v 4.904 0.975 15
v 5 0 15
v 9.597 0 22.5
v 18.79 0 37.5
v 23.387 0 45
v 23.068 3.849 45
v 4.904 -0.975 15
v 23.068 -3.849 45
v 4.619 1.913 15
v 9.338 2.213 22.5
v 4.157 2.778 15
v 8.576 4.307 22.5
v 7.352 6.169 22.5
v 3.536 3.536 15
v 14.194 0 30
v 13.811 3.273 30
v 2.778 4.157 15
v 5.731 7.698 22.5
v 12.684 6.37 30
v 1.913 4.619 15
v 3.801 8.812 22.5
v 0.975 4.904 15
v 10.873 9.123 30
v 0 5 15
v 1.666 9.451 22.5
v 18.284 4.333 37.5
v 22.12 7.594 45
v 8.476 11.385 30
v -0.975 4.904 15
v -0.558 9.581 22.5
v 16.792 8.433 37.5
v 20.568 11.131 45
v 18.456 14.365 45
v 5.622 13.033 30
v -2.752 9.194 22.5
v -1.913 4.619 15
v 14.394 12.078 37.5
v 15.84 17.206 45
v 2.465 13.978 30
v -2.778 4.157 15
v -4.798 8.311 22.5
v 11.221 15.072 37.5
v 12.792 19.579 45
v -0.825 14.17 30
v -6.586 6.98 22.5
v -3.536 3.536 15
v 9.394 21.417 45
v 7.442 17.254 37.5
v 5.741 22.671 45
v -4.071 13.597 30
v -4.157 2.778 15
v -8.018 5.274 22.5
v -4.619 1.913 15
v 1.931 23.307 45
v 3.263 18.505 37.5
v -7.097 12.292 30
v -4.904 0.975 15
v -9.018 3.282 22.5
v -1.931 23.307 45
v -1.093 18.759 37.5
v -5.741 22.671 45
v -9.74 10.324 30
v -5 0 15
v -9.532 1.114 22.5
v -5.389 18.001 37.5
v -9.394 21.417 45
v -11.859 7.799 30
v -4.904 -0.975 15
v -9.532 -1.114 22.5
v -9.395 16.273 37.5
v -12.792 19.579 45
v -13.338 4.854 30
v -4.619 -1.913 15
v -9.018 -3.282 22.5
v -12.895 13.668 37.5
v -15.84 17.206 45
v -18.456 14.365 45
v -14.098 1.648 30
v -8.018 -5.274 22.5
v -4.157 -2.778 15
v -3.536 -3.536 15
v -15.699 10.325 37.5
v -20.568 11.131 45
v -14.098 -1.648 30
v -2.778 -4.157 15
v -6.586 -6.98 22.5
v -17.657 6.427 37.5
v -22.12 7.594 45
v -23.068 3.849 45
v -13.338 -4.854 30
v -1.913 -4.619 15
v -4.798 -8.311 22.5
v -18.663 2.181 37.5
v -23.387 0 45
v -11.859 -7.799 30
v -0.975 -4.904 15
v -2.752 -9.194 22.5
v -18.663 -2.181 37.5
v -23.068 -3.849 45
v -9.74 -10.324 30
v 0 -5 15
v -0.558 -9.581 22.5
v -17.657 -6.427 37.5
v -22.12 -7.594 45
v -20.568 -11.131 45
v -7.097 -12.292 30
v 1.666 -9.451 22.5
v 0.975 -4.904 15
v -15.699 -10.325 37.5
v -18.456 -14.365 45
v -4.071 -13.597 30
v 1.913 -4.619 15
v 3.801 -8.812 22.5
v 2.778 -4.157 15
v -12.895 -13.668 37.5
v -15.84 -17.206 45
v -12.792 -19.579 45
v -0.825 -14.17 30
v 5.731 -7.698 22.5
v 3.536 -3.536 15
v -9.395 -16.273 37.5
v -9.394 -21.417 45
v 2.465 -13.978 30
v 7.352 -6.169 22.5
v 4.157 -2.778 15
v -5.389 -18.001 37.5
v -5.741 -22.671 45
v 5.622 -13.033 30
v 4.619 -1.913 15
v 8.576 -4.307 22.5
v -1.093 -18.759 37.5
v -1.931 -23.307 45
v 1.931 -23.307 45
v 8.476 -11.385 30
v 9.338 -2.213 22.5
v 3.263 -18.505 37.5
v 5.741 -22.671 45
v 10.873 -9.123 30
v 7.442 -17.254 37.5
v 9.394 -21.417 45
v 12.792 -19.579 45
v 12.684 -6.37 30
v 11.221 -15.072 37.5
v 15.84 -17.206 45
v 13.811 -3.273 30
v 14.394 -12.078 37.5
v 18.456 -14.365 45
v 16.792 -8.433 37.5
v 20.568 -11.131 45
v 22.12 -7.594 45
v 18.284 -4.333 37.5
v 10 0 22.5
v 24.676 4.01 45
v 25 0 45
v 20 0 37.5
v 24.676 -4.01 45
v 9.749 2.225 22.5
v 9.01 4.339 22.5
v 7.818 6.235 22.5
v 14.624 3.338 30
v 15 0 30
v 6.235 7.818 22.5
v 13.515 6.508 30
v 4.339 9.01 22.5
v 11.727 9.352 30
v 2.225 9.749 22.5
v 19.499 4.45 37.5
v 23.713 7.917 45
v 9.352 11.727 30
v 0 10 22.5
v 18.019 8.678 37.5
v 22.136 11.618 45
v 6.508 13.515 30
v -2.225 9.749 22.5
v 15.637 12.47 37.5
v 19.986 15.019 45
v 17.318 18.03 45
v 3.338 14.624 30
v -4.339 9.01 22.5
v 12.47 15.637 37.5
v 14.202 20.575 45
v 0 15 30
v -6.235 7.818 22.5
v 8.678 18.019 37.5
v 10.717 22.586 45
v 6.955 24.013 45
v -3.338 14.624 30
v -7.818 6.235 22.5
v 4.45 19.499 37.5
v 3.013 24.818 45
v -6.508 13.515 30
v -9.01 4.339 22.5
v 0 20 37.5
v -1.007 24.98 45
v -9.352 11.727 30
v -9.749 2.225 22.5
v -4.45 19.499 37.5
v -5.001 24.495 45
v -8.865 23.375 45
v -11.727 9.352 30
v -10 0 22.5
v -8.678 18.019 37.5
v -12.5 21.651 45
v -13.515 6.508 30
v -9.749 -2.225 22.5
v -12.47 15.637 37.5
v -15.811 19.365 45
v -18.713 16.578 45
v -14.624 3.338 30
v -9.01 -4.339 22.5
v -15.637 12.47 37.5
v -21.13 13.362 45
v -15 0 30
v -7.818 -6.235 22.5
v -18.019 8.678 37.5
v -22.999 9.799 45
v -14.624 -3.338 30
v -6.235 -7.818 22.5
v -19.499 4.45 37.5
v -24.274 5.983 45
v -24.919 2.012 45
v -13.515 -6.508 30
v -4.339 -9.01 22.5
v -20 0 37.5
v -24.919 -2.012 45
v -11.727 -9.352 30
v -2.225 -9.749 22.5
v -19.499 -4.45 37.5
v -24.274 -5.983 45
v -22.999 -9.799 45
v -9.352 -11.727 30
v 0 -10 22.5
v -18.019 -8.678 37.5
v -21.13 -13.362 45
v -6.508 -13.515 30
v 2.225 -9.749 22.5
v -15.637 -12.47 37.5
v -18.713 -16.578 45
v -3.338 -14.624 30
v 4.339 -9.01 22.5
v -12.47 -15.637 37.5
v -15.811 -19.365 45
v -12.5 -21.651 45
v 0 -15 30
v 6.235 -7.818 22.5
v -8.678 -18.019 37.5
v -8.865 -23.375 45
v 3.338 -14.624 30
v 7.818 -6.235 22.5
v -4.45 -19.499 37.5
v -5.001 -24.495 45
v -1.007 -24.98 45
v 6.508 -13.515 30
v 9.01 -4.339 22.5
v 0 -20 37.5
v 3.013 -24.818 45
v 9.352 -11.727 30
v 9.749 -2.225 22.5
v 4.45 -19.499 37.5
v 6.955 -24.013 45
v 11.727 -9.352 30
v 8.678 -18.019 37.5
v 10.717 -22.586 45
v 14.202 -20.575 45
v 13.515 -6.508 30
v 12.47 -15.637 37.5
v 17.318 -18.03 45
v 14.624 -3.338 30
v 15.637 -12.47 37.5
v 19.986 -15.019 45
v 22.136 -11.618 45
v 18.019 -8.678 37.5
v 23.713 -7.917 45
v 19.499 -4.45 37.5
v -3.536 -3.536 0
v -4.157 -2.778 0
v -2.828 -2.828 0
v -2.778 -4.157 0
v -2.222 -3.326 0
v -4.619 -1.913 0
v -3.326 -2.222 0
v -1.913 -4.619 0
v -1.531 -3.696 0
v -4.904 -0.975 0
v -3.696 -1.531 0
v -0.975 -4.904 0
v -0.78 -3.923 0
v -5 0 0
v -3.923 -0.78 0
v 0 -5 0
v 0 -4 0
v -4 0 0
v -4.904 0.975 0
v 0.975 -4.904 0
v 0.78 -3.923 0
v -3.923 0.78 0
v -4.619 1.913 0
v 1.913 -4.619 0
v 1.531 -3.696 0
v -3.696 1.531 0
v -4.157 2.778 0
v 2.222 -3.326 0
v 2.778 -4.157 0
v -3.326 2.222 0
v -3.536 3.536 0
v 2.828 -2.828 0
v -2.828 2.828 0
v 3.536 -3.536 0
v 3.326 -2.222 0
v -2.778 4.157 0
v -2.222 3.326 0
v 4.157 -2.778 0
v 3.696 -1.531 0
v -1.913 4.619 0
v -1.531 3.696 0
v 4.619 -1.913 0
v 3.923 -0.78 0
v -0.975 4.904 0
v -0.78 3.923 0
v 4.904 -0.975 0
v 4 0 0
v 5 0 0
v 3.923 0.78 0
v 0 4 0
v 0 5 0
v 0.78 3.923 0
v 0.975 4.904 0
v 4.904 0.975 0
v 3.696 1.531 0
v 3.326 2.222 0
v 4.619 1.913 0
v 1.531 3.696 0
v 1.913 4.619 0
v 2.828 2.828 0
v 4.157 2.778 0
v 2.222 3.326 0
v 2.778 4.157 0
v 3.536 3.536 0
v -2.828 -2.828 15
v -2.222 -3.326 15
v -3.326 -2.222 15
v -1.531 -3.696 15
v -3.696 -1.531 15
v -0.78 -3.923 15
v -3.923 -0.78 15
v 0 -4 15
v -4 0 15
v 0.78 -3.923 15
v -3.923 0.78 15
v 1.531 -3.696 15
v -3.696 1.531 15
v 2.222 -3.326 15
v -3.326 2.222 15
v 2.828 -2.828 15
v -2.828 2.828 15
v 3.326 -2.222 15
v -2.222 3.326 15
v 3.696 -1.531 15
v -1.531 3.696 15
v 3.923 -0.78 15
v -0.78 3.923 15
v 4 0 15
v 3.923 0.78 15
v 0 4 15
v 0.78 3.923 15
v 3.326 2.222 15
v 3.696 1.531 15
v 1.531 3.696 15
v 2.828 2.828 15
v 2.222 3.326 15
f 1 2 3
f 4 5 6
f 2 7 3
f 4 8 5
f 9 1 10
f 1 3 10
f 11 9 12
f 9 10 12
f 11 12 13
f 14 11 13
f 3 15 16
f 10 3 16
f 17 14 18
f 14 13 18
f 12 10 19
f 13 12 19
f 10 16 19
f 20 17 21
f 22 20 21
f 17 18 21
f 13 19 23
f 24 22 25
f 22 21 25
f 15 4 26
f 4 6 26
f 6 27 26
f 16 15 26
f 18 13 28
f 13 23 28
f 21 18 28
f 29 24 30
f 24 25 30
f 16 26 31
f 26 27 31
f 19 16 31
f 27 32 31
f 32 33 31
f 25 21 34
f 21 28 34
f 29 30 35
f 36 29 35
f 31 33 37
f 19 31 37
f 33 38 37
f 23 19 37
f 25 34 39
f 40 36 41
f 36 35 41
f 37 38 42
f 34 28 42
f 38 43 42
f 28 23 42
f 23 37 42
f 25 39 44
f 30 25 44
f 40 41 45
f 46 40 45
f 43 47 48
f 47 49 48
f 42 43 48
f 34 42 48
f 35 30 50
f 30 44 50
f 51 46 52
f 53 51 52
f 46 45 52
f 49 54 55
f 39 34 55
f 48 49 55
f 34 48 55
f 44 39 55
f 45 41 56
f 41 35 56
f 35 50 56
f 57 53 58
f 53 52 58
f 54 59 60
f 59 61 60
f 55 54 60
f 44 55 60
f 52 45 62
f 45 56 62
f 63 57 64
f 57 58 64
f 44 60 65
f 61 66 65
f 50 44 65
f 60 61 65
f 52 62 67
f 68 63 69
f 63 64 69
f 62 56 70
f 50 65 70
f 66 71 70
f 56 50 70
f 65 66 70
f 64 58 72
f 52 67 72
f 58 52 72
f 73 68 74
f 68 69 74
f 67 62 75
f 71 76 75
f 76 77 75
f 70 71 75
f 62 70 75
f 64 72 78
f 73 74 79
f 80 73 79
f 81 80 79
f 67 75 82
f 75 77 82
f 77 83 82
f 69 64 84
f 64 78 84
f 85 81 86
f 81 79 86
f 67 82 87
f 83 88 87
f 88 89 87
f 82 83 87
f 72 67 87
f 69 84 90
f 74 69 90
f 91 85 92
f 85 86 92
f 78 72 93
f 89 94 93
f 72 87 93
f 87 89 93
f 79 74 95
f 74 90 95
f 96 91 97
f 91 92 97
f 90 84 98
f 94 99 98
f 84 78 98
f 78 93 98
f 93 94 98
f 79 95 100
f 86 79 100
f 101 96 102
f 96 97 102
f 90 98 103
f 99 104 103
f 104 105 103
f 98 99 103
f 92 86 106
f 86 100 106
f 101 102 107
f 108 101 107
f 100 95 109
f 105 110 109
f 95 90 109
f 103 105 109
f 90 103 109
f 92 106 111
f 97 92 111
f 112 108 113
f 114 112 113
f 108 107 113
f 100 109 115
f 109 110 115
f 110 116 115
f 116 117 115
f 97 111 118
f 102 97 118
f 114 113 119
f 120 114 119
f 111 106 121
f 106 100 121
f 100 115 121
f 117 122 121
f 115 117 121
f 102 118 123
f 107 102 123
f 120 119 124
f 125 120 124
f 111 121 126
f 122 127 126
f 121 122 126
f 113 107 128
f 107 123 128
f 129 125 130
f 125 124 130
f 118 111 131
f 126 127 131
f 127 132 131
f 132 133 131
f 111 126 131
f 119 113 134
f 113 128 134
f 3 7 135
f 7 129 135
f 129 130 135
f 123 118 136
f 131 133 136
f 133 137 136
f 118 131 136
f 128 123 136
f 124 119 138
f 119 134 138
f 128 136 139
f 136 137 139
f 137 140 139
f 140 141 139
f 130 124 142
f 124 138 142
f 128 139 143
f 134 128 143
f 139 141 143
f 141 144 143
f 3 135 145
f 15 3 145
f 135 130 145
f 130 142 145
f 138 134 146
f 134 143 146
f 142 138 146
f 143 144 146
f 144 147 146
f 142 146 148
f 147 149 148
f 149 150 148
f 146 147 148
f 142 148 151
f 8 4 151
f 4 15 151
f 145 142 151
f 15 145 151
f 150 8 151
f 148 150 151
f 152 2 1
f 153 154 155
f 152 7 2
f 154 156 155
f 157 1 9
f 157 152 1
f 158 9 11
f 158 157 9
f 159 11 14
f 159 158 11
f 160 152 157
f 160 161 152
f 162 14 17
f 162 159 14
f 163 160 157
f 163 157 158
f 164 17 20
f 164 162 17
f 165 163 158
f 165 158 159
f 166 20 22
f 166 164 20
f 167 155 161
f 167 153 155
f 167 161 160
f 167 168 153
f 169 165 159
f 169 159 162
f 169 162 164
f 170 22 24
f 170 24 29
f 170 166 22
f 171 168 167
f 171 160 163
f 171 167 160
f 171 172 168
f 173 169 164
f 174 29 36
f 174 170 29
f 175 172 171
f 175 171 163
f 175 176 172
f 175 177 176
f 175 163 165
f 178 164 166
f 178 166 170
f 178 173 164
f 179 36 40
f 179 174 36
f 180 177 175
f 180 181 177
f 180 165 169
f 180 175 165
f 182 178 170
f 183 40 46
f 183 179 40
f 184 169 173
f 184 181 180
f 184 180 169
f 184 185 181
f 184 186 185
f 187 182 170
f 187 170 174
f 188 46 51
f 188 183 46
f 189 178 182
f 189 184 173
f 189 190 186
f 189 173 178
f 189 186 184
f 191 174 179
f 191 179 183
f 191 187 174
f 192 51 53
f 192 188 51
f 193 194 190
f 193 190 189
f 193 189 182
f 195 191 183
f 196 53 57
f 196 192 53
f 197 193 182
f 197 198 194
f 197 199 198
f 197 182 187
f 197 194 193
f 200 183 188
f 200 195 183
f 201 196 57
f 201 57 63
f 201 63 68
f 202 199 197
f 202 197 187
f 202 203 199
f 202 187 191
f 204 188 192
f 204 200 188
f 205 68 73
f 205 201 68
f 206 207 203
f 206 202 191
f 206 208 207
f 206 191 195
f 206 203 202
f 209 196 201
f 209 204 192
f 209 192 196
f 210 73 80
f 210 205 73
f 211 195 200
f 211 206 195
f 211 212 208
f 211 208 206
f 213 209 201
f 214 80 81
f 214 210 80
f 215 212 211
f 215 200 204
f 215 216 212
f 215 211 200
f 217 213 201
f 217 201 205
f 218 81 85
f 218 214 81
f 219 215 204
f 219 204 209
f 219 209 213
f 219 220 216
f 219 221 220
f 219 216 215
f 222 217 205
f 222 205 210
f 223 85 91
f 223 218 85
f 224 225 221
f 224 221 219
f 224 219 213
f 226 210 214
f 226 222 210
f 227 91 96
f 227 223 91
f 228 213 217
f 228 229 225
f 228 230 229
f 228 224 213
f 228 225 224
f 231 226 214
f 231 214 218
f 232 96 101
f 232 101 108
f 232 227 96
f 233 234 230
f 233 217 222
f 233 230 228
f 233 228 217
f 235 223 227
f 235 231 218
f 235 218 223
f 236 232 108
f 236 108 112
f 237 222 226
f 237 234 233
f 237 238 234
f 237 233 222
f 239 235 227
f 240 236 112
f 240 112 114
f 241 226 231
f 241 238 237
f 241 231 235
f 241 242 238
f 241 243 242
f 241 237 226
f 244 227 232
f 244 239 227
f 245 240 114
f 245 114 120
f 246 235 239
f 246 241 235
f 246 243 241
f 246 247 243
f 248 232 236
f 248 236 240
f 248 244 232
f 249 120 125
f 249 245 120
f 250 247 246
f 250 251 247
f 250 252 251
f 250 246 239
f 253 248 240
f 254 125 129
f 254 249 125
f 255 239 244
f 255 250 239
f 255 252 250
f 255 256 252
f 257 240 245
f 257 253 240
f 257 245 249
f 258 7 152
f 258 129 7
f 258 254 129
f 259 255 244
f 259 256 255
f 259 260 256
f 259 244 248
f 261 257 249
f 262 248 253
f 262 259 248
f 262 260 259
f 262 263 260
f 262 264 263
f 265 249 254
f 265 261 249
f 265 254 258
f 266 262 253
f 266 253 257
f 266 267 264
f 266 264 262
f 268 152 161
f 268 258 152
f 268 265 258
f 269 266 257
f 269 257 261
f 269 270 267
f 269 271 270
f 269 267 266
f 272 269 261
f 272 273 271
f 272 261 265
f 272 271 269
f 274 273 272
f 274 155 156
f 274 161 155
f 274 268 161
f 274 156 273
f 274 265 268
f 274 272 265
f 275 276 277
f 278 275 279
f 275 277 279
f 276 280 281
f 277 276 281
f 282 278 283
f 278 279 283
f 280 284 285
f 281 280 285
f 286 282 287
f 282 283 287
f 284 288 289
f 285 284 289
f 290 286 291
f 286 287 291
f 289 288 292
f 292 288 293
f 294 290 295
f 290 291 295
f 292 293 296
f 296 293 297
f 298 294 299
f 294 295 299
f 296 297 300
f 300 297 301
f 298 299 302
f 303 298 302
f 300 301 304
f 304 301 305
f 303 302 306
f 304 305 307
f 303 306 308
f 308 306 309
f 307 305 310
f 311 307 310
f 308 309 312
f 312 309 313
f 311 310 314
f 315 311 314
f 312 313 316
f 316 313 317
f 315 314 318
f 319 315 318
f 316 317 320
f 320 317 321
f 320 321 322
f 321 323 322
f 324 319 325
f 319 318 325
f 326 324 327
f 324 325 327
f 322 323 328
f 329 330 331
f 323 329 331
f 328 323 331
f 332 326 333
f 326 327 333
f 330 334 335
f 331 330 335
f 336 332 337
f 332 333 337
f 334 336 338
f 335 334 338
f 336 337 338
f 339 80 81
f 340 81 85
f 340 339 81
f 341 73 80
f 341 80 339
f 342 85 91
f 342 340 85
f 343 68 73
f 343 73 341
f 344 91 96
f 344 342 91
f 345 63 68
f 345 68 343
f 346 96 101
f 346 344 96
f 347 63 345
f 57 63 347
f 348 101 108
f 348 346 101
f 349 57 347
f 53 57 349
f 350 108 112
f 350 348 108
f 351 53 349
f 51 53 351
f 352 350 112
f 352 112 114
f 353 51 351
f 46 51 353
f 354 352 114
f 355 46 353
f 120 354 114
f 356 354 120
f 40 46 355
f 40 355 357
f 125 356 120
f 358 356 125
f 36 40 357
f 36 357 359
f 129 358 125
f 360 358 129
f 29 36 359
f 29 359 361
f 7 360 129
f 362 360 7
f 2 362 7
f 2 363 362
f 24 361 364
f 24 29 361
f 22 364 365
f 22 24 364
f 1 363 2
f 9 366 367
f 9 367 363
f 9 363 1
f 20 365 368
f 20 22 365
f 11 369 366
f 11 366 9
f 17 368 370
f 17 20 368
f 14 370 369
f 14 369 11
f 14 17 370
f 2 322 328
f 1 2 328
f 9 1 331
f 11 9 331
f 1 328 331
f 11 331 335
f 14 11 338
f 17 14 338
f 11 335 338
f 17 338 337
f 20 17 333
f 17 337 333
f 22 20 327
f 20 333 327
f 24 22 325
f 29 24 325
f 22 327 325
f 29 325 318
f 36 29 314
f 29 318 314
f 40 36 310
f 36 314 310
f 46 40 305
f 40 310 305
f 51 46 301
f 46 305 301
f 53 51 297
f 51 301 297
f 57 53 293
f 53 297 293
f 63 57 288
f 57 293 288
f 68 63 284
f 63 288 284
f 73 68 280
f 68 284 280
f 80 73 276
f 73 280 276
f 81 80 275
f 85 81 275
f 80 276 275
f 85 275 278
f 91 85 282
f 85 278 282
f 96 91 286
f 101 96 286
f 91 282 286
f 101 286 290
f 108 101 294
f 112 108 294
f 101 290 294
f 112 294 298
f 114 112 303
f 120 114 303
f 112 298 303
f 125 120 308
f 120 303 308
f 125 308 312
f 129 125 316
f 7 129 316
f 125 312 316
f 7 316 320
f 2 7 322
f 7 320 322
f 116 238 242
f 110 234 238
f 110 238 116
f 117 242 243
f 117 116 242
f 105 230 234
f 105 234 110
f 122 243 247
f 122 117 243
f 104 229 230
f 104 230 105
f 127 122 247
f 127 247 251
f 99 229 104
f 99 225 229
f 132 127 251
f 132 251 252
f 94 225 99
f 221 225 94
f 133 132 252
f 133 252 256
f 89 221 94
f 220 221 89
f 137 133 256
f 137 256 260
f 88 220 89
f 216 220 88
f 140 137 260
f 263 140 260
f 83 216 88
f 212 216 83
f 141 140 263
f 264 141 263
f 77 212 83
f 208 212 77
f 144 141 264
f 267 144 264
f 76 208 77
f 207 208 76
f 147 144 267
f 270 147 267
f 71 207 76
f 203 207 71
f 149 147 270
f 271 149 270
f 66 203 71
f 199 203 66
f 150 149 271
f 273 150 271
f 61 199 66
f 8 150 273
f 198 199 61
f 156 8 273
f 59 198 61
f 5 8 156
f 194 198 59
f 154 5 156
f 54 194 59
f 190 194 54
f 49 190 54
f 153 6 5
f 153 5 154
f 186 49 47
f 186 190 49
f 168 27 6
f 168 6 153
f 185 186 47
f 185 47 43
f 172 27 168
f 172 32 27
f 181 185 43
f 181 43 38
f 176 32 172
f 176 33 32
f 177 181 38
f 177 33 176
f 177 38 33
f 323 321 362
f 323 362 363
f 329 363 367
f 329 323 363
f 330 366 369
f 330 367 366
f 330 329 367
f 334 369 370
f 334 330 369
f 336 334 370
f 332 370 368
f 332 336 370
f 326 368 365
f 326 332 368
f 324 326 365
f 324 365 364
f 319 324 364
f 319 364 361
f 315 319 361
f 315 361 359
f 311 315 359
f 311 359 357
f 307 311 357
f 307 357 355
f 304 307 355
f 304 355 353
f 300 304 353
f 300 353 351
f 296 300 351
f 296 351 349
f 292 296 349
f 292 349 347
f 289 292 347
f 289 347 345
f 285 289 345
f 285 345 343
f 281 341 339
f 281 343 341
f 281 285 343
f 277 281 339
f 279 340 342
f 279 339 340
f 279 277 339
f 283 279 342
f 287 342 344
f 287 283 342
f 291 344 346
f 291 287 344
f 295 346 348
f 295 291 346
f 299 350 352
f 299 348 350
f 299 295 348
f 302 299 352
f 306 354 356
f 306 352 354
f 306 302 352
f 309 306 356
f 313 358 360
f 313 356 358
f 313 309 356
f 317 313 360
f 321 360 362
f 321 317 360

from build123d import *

# Parameters (mm, degrees)
CYLINDER001_R     = 4
CYLINDER001_DEPTH = 17
CYLINDER_R        = 5
CYLINDER_DEPTH    = 15


with BuildPart() as cilindre001:
    # Cylinder001 → Cylinder001 (new body)
    with BuildSketch(Plane.XY.offset(-1)):
        Circle(CYLINDER001_R)
    extrude(amount=CYLINDER001_DEPTH)


with BuildPart() as cut:
    # Cylinder → Cylinder (new body)
    with BuildSketch(Plane.XY):
        Circle(CYLINDER_R)
    extrude(amount=CYLINDER_DEPTH)

    # Cut: cut Cilindre001
    add(cilindre001.part, mode=Mode.SUBTRACT)


with BuildPart() as con001:
    # Cone001 → Cone001 (revolve)
    with BuildSketch(Plane(origin=(0, 0, 15), x_dir=(1, 0, 0), z_dir=(0, -1, 0))):
        Polygon((0, 0), (5, 0), (24, 31), (0, 31), align=None)
    revolve(axis=Axis((0, 0, 15), (0, 0, 1)))


with BuildPart() as cut001:
    # Cone → Cone (revolve)
    with BuildSketch(Plane(origin=(0, 0, 15), x_dir=(1, 0, 0), z_dir=(0, -1, 0))):
        Polygon((0, 0), (5, 0), (25, 30), (0, 30), align=None)
    revolve(axis=Axis((0, 0, 15), (0, 0, 1)))

    # Cut001: cut Con001
    add(con001.part, mode=Mode.SUBTRACT)


solid = Compound([cut.part, cut001.part])
